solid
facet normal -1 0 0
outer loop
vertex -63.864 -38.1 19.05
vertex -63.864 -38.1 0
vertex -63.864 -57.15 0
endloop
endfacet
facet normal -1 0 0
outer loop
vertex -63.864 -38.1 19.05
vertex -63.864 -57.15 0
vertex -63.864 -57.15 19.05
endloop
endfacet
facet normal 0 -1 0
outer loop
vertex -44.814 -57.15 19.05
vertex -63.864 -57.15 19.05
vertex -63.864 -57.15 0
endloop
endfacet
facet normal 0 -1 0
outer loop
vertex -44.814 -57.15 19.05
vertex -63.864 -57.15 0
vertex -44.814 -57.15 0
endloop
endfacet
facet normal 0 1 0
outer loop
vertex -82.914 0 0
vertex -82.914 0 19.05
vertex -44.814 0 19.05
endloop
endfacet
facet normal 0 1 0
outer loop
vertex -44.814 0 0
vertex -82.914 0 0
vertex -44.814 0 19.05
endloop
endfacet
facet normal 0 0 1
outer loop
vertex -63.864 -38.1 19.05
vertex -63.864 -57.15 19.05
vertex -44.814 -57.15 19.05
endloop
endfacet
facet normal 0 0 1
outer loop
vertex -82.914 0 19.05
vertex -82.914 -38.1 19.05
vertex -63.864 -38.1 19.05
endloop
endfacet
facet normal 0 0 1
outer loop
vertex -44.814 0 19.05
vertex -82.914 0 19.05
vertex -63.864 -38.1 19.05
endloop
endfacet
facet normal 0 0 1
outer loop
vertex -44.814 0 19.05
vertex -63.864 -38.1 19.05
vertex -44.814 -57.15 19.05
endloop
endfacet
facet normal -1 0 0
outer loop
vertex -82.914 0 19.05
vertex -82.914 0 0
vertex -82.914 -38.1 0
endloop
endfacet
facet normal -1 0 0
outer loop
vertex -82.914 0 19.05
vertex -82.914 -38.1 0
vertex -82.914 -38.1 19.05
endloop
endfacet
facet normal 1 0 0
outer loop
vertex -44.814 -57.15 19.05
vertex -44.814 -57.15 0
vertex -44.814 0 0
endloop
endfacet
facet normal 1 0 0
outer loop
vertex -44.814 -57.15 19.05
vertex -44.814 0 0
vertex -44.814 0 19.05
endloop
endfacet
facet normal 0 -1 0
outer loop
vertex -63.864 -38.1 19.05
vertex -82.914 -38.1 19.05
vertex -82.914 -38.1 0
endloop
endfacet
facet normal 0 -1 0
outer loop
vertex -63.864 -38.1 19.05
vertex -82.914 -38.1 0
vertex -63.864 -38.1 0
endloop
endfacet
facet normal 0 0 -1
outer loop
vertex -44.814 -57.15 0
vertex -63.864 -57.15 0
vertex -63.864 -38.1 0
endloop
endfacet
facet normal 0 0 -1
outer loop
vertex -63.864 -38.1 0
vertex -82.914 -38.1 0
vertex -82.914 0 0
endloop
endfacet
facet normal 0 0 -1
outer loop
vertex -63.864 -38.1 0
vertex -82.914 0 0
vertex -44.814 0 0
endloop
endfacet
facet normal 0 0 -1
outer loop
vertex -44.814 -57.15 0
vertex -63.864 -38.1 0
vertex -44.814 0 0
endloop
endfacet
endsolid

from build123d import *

# Parameters (mm, degrees)
F0_W     = 19.05
F0_H     = 19.05
F1_DEPTH = 38.1
F2_DEPTH = 57.15


with BuildPart() as f1:
    # F0 (on Front) → F1 (new body)
    with BuildSketch(Plane.XZ):
        with Locations((-73.389372, 9.525)):
            Rectangle(F0_W, F0_H)
    extrude(amount=F1_DEPTH)

    # F0 (on Front) → F2 (join)
    with BuildSketch(Plane.XZ):
        with Locations((-54.339372, 9.525)):
            Rectangle(F0_W, F0_H)
    extrude(amount=F2_DEPTH)


solid = f1.part
